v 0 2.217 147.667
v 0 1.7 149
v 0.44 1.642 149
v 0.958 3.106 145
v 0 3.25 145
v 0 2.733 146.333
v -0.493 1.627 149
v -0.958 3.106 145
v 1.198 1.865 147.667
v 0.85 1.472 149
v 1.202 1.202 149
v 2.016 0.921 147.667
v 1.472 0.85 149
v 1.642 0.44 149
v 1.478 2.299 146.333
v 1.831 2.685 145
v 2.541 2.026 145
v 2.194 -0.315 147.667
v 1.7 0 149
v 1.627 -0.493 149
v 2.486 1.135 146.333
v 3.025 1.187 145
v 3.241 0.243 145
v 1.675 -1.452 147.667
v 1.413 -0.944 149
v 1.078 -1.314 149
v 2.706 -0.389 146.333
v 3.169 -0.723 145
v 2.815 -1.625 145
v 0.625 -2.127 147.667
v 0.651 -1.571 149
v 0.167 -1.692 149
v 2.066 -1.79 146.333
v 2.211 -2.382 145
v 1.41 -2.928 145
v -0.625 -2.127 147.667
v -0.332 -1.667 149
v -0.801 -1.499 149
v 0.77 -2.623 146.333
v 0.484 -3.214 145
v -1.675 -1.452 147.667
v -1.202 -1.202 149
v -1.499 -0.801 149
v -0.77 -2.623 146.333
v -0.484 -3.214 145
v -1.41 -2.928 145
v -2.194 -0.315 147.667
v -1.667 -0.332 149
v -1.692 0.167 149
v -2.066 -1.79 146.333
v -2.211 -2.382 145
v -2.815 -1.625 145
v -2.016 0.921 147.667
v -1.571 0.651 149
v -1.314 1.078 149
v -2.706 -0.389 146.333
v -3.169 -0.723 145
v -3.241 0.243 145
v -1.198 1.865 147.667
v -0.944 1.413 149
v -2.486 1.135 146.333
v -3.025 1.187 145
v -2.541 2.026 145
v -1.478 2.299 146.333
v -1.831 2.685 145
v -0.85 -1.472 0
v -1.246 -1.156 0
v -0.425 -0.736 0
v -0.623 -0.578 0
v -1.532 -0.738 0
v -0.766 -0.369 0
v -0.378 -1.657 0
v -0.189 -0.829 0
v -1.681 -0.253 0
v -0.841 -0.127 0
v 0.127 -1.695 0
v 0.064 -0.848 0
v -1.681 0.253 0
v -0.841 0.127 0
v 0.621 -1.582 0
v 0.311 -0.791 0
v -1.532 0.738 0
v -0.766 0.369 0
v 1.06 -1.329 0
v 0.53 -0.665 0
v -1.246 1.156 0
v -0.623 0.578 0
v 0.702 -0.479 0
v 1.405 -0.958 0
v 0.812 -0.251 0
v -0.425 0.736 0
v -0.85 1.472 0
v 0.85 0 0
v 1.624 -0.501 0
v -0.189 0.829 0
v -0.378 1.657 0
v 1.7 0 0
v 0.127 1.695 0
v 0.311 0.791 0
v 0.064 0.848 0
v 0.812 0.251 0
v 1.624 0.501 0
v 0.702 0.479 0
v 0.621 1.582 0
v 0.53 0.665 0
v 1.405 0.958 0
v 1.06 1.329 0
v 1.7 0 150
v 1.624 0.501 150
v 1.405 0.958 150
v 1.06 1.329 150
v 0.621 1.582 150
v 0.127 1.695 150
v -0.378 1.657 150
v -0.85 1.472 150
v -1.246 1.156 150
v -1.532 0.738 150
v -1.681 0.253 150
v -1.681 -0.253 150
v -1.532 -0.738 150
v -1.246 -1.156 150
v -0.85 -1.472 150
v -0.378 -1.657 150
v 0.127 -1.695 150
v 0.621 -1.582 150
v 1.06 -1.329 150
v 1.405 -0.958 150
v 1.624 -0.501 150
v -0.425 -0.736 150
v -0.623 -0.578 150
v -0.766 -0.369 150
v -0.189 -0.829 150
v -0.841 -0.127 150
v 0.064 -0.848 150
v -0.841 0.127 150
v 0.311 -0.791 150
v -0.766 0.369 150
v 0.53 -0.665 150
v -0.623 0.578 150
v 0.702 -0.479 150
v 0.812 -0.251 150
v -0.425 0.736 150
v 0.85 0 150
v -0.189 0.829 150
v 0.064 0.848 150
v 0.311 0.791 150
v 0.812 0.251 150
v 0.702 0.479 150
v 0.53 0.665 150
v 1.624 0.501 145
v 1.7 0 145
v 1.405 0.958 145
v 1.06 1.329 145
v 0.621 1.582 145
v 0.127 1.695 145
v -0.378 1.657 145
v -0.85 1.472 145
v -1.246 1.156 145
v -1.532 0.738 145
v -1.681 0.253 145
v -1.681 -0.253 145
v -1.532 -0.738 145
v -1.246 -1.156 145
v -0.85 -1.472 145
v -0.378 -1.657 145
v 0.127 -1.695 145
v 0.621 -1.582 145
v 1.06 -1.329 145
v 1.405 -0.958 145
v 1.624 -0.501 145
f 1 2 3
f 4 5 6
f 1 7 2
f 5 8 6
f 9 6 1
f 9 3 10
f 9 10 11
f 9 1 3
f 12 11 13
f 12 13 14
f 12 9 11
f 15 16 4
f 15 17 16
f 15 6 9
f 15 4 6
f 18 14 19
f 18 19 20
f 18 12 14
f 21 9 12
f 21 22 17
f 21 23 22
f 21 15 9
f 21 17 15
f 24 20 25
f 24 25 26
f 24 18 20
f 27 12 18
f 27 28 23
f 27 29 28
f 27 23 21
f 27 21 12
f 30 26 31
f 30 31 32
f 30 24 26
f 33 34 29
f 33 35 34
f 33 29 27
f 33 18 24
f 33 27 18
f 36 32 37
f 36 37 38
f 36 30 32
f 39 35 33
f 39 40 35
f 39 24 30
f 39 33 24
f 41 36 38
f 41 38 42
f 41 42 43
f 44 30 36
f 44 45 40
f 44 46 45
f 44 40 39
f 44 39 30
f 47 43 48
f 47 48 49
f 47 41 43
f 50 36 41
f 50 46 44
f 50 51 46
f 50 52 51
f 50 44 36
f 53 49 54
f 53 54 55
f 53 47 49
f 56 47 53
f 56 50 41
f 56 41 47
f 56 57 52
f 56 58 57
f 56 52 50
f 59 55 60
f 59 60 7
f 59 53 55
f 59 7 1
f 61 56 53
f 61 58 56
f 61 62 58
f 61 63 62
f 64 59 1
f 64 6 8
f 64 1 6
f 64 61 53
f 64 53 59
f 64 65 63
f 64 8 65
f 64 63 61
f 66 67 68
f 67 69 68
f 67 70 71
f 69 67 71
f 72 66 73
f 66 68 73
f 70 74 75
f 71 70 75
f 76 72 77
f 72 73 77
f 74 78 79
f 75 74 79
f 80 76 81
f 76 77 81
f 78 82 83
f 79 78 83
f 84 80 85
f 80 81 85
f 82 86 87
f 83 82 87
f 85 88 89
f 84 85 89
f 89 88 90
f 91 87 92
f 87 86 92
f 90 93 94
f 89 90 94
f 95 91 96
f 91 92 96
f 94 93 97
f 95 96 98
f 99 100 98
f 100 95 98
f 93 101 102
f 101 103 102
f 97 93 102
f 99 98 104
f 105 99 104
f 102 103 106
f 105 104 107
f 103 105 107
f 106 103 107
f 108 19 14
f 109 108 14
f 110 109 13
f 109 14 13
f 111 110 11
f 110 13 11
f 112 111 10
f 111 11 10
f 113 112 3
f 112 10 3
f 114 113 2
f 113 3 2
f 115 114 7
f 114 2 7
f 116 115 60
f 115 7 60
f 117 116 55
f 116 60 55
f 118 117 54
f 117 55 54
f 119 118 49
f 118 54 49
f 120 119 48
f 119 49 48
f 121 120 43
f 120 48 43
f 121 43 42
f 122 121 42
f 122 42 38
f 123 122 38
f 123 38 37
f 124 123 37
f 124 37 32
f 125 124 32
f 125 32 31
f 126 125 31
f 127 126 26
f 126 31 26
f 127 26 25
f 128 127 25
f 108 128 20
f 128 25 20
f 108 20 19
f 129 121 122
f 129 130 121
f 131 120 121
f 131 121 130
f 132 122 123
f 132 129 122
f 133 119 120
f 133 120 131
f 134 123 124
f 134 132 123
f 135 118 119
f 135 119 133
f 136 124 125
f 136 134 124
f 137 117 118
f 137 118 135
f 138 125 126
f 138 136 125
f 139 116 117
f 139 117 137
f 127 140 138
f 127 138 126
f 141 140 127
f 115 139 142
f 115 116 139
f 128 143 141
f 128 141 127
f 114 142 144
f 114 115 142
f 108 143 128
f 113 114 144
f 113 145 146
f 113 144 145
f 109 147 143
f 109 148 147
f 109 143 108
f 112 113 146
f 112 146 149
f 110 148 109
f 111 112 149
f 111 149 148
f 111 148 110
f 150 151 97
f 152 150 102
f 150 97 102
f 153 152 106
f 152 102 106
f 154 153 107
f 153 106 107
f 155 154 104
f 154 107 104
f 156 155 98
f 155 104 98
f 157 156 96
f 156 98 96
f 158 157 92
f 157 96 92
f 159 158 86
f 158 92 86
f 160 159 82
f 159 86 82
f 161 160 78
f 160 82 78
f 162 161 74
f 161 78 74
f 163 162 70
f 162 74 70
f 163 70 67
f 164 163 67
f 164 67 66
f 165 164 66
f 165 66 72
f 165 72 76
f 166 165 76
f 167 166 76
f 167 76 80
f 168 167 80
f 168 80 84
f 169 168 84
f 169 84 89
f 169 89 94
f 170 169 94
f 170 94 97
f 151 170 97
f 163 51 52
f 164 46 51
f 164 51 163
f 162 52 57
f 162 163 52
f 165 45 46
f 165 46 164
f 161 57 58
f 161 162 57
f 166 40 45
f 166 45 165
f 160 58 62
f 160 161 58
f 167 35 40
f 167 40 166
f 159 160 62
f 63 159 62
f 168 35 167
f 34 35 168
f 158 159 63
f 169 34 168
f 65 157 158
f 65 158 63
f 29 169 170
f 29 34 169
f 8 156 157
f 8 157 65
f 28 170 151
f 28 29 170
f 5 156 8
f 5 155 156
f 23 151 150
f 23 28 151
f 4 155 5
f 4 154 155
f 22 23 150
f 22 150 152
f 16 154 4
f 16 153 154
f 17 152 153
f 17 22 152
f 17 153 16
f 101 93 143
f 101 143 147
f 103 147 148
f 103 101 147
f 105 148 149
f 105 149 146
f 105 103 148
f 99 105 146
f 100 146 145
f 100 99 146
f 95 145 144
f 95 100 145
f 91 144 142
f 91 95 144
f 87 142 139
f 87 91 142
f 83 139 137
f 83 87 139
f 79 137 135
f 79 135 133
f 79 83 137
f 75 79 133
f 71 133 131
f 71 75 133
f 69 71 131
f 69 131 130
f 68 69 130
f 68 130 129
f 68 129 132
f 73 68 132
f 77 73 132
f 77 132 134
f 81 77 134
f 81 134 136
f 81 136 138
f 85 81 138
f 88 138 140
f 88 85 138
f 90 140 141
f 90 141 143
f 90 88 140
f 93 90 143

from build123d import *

# Parameters (mm, degrees)
SKETCH1_R           = 1.7
SKETCH1_R_2         = 0.85
BOSS_EXTRUDE1_DEPTH = 150


with BuildPart() as part:
    # Sketch1 → Boss-Extrude1 (new body)
    with BuildSketch(Plane.XY):
        Circle(SKETCH1_R)
        Circle(SKETCH1_R_2, mode=Mode.SUBTRACT)
    extrude(amount=BOSS_EXTRUDE1_DEPTH)

    # Sketch3 → Revolve1 (revolve)
    with BuildSketch(Plane(origin=(0, 0, 0), x_dir=(0, 0, -1), z_dir=(1, 0, 0))):
        Polygon((-149, 1.7), (-145, 3.25), (-145, 1.7), align=None)
    revolve(axis=Axis((0, 0, 150), (0, 0, -1)))


solid = part.part
